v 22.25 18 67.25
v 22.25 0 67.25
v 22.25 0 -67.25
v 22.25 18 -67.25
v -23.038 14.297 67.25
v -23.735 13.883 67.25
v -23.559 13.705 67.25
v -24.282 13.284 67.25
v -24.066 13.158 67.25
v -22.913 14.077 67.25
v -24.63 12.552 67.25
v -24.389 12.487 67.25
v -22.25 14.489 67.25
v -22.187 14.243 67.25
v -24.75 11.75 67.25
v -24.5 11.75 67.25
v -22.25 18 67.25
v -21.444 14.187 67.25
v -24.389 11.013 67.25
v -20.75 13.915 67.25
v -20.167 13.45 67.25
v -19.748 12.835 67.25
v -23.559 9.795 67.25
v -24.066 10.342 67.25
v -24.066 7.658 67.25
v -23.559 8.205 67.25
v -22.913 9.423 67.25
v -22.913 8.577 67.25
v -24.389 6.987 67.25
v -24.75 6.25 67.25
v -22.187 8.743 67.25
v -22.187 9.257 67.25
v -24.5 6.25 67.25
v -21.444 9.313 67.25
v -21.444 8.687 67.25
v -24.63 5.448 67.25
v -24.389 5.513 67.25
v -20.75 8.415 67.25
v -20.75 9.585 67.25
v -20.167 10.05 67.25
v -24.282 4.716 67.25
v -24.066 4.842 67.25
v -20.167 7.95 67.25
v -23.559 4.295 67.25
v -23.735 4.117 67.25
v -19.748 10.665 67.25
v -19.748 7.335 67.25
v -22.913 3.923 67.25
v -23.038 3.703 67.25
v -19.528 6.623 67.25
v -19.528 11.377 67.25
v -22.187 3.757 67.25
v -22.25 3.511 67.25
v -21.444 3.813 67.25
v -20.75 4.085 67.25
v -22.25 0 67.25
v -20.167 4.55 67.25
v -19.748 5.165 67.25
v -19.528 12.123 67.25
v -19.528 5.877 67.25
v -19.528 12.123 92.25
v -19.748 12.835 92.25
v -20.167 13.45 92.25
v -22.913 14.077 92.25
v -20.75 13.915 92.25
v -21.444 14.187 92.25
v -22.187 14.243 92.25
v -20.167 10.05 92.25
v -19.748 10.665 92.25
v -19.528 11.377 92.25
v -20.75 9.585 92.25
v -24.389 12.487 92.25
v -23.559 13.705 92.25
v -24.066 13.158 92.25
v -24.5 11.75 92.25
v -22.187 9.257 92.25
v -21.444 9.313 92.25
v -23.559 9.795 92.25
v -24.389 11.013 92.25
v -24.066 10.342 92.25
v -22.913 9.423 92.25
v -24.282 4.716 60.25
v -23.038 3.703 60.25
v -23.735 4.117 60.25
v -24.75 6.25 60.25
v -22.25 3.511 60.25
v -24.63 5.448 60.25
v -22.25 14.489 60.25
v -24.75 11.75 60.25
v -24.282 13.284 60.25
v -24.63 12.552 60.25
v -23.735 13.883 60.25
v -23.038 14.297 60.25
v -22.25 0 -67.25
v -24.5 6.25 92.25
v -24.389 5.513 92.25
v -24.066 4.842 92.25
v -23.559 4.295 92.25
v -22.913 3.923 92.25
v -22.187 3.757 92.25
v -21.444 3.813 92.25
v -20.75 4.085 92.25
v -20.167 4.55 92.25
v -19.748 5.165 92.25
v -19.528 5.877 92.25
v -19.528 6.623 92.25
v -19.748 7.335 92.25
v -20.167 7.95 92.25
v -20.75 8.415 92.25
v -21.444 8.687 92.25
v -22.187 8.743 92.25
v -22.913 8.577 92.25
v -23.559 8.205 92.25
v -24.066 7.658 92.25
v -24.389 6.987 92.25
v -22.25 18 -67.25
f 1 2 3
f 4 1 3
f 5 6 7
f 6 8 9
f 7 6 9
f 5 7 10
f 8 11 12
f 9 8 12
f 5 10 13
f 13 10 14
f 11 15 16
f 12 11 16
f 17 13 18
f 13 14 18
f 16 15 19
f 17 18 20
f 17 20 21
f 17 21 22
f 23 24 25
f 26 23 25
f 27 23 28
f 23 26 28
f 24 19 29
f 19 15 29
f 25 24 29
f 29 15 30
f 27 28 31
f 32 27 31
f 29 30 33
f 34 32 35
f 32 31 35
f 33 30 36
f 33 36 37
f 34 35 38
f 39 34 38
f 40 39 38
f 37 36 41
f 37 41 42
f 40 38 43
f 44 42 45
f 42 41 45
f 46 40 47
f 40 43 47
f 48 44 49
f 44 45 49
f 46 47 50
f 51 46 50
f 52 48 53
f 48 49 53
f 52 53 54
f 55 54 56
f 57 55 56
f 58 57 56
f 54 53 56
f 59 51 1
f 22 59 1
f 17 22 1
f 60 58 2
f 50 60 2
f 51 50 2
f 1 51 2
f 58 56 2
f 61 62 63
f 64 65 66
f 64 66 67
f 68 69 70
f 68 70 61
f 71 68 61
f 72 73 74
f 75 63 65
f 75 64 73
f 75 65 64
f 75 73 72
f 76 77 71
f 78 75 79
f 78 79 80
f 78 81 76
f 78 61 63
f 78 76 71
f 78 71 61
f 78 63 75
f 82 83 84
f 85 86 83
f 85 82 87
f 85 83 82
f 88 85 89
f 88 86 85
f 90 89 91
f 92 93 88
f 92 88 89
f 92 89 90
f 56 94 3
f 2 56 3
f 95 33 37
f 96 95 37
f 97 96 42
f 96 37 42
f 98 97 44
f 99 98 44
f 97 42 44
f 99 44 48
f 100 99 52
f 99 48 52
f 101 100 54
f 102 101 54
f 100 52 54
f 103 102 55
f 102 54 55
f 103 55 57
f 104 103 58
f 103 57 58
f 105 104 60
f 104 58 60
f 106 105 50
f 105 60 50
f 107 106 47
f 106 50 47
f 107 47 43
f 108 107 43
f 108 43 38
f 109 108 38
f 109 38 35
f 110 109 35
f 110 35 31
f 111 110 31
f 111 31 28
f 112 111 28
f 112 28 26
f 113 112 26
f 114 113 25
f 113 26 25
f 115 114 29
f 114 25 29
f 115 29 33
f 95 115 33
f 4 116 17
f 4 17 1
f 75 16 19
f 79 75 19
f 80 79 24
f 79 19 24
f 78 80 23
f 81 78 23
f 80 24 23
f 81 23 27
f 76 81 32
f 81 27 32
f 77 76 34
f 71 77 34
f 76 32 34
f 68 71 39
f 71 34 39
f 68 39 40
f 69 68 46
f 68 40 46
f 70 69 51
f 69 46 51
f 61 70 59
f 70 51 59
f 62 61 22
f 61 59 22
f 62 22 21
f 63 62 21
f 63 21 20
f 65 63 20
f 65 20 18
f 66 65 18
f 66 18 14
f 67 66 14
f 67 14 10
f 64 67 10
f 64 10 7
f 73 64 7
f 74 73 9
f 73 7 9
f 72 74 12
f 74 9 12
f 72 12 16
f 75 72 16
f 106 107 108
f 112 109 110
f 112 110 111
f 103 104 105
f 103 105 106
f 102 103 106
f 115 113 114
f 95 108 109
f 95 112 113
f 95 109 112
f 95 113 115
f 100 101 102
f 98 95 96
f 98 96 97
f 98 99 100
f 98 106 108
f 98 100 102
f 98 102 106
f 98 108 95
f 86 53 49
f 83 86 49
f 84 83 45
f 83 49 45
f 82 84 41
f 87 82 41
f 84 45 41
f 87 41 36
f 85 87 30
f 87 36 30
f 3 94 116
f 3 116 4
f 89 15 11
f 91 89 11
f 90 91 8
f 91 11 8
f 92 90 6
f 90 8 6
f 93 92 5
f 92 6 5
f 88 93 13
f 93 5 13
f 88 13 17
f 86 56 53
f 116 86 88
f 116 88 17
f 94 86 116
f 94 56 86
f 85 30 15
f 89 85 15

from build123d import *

# Parameters (mm, degrees)
SKETCH1_W           = 44.5
SKETCH1_H           = 134.5
BOSS_EXTRUDE1_DEPTH = 18
BOSS_EXTRUDE2_DEPTH = 7
SKETCH5_R           = 2.5
BOSS_EXTRUDE4_DEPTH = 25


with BuildPart() as part:
    # Sketch1 → Boss-Extrude1 (new body)
    with BuildSketch(Plane(origin=(0, 0, 0), x_dir=(1, 0, 0), z_dir=(0, 1, 0))):
        Rectangle(SKETCH1_W, SKETCH1_H)
    extrude(amount=BOSS_EXTRUDE1_DEPTH)

    # Sketch3 → Boss-Extrude2 (add)
    with BuildSketch(Plane.XY.offset(67.25)):
        with BuildLine():
            Line((-22.25, 14.488612788), (-22.25, 3.511387212))
            ThreePointArc((-22.25, 3.511387212), (-24.031009601, 4.395950378), (-24.75, 6.25))
            Line((-24.75, 6.25), (-24.75, 11.75))
            ThreePointArc((-24.75, 11.75), (-24.031009601, 13.604049622), (-22.25, 14.488612788))
        make_face()
    extrude(amount=-BOSS_EXTRUDE2_DEPTH)

    # Sketch5 → Boss-Extrude4 (add)
    with BuildSketch(Plane.XY.offset(67.25)):
        with Locations(Location((-22, 11.75, 0), (0, 0, 180))):
            Circle(SKETCH5_R)
        with Locations(Location((-22, 6.25, 0), (0, 0, 180))):
            Circle(SKETCH5_R)
    extrude(amount=BOSS_EXTRUDE4_DEPTH)


solid = part.part
